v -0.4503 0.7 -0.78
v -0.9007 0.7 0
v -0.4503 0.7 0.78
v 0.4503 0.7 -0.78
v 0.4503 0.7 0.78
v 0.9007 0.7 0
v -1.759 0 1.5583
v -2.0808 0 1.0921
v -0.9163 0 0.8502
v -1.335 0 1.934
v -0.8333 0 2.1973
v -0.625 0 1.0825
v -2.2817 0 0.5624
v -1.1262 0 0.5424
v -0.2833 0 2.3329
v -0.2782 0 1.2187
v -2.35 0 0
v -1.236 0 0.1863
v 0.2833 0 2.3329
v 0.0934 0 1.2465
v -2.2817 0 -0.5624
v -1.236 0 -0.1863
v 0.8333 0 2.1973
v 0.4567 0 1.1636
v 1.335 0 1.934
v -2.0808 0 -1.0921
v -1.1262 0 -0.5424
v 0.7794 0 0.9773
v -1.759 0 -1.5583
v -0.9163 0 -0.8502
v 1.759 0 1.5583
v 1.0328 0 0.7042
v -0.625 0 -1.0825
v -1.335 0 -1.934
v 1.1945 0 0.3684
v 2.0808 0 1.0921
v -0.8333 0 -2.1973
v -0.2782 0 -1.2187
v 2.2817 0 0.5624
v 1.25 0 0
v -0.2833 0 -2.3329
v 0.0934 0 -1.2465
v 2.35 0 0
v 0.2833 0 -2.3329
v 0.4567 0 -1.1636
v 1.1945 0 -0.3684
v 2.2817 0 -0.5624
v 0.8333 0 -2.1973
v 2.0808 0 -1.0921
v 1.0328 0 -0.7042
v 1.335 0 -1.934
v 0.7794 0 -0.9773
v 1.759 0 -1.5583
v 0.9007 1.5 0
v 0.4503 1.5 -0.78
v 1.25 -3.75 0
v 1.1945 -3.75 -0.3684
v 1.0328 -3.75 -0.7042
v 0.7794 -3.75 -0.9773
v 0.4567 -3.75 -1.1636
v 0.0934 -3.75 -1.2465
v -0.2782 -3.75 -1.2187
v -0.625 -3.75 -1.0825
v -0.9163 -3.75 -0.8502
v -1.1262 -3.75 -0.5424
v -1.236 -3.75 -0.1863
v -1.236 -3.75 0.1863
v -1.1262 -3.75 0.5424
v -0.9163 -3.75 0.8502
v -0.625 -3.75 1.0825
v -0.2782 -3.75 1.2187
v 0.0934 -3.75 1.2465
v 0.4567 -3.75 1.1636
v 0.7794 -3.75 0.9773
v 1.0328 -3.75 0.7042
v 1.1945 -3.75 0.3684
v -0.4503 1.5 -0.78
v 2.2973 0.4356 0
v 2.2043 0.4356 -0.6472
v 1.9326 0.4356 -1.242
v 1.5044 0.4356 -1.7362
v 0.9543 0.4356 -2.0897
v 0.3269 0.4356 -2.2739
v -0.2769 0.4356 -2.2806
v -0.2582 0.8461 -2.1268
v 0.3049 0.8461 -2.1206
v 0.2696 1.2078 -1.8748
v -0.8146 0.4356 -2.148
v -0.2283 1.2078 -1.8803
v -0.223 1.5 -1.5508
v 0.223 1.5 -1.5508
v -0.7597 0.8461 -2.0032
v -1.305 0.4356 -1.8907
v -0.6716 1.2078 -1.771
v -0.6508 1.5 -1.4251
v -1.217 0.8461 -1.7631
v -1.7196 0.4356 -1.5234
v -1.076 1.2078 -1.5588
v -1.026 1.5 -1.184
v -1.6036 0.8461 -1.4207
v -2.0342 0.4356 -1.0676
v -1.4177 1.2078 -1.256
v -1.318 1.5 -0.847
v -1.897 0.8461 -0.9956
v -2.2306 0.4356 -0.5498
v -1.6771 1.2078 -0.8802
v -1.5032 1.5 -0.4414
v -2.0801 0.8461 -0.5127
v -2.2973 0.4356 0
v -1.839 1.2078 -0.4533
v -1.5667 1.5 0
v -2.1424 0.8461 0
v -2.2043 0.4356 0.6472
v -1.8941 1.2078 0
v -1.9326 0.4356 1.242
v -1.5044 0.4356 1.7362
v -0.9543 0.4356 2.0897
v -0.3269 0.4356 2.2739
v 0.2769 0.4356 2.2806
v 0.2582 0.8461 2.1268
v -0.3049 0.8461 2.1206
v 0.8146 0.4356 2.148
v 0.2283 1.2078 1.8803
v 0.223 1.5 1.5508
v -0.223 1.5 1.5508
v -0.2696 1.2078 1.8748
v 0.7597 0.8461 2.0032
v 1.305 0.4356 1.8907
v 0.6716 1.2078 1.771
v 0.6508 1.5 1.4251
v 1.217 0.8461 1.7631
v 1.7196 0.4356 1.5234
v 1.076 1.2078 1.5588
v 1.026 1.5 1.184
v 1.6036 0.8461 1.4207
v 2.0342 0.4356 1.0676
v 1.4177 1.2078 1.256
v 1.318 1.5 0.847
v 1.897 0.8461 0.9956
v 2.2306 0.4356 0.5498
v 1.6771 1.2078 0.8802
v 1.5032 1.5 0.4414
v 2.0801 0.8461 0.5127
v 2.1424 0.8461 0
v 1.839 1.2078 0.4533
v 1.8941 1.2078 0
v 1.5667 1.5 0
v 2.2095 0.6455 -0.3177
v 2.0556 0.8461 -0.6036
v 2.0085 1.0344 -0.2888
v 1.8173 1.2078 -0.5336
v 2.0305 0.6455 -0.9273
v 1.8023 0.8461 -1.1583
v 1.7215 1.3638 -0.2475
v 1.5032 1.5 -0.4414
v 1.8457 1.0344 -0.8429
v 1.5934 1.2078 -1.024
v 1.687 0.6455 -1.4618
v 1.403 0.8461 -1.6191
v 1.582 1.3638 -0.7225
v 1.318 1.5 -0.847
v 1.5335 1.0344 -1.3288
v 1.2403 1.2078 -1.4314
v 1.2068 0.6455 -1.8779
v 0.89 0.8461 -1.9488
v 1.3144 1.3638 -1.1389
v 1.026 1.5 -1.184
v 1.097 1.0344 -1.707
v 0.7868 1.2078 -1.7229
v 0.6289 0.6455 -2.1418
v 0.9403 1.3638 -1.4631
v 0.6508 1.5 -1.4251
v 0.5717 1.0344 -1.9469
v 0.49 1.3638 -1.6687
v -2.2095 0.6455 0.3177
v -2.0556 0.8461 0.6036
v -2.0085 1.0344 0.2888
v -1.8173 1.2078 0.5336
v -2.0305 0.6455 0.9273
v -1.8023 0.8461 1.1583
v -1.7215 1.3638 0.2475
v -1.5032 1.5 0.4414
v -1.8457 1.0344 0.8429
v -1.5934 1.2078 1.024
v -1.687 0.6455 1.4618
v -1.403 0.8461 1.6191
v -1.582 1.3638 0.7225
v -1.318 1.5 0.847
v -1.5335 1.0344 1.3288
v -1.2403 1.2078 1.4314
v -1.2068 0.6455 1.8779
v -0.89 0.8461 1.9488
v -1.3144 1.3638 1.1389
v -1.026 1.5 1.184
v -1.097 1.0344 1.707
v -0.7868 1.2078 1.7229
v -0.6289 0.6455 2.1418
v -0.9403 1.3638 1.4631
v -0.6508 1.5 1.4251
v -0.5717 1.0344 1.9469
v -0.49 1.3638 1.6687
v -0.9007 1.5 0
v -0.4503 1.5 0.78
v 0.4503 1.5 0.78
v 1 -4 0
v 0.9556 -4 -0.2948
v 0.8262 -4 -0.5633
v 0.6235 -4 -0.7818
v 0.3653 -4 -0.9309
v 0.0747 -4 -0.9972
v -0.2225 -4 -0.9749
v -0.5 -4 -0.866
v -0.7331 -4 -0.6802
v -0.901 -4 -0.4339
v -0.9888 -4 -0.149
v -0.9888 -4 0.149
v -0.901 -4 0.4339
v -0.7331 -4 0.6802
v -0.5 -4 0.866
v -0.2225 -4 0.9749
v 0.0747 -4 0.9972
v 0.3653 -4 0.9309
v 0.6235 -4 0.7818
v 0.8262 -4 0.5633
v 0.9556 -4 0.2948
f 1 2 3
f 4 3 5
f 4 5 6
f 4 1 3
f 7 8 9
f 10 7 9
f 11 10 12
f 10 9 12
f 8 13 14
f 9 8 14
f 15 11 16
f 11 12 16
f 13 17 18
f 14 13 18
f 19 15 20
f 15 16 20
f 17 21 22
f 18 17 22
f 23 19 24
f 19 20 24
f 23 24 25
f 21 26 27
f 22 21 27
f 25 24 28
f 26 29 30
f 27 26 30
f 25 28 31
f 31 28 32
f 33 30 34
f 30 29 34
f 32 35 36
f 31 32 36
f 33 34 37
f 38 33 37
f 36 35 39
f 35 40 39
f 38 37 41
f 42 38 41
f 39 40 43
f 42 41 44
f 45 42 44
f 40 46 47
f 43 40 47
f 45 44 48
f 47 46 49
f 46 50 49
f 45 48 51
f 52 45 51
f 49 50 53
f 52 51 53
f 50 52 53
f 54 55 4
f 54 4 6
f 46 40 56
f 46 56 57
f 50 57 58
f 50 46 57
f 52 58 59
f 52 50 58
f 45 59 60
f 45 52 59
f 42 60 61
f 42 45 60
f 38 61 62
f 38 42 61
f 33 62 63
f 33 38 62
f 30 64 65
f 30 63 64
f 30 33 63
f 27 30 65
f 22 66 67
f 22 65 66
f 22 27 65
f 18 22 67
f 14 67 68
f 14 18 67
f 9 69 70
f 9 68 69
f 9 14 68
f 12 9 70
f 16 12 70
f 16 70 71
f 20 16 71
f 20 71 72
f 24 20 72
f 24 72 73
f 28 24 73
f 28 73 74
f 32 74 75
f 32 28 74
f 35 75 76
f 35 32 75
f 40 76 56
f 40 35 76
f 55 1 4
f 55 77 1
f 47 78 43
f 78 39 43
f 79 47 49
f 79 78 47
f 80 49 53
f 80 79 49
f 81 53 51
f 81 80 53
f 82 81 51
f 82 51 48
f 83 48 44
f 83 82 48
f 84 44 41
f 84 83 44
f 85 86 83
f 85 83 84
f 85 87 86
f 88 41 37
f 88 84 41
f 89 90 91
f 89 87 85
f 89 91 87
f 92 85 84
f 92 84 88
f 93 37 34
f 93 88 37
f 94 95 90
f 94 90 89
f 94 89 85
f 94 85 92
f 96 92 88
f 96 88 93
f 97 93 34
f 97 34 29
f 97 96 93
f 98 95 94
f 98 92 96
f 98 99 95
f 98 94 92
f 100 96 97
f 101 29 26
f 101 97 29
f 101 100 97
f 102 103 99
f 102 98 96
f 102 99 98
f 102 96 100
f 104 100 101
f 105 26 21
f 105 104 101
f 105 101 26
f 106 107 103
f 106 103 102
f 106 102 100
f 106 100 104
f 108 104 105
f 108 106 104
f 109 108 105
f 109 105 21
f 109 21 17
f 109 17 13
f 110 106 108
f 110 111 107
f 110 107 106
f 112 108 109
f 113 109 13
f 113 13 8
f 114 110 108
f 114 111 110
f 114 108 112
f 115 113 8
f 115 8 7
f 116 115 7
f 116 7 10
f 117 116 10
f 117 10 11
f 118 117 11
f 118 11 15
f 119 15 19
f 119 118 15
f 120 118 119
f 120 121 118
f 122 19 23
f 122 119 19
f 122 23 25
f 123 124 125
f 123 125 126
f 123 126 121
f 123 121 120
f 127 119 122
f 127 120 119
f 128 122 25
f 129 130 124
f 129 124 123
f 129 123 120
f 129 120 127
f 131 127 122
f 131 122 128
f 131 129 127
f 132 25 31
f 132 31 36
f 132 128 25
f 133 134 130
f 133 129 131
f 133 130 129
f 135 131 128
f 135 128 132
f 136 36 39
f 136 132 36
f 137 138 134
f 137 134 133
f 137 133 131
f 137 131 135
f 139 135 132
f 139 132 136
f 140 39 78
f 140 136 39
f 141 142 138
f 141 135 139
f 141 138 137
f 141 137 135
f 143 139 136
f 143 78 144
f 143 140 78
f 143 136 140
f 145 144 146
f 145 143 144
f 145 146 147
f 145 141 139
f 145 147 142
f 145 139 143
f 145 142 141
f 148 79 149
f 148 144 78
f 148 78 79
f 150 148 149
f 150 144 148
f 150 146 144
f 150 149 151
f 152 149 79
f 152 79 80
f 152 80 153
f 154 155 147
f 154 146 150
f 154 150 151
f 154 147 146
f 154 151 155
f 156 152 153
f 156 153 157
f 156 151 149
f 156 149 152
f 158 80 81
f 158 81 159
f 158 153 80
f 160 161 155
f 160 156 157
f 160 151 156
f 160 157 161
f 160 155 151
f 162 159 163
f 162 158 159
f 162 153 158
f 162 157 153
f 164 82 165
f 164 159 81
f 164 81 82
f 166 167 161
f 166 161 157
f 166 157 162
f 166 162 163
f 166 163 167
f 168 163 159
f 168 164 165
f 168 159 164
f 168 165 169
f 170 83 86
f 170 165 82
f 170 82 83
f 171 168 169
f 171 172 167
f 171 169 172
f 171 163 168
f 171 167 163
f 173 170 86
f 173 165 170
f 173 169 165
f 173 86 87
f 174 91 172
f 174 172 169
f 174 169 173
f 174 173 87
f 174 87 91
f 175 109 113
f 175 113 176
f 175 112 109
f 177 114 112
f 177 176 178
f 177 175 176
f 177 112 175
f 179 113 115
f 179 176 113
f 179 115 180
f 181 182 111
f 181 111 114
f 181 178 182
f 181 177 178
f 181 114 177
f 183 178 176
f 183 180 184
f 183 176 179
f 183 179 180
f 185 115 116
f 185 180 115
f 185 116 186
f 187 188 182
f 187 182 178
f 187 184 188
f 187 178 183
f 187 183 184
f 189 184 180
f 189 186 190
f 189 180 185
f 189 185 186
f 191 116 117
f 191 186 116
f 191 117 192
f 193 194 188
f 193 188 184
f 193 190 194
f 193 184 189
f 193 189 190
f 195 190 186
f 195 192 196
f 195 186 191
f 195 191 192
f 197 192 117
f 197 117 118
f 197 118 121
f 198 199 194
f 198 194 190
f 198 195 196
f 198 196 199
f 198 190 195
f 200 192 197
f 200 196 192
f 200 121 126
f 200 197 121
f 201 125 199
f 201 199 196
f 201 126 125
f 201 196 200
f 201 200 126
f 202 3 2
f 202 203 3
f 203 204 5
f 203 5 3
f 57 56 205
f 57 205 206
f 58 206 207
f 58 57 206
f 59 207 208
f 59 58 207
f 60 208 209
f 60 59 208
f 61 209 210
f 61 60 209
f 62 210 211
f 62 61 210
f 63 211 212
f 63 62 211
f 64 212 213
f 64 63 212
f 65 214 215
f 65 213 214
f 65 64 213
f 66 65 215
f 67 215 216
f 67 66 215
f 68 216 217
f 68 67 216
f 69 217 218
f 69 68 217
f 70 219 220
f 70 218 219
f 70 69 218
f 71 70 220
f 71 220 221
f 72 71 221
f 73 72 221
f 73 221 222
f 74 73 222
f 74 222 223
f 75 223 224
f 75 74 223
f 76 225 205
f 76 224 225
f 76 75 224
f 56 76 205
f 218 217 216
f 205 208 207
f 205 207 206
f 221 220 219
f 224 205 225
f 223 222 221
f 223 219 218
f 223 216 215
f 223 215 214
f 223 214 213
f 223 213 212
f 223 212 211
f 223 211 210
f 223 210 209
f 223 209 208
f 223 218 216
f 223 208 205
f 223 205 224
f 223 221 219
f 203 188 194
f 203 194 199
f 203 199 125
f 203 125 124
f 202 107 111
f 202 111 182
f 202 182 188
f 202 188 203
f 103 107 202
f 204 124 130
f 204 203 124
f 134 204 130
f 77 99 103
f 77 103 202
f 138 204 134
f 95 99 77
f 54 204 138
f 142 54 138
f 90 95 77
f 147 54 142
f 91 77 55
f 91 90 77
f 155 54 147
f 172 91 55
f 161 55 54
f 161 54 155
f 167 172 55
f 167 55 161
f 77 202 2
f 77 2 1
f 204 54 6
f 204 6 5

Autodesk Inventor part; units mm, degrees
ref_plane "YZ Plane" through (0, 0, 0) normal (1, 0, 0) x (0, 1, 0)
ref_plane "XZ Plane" through (0, 0, 0) normal (0, 1, 0) x (-1, 0, 0)
ref_plane "XY Plane" through (0, 0, 0) normal (0, 0, 1) x (1, 0, 0)
sketch "Schizzo2" plane through (0, 0, 0) normal (0, 0, 1) x (1, 0, 0)
  line L0 (0, 0) -> (0, 1.5)
  line L1 (0, 1.5) -> (1.5667, 1.5)
  line L2 (0, 0) -> (2.35, 0)
  arc A0 (2.35, 0) -> (1.5667, 1.5) centre (0.5222, 0) ccw
  dimension "d0" = 2.35
  dimension "d1" = 1.5
  dimension "d2" = 1.5667
revolve "Rivoluzione1" add sketch "Schizzo2" angle 360 about axis through (0, 0, 0) along (0, 1, 0)
sketch "Schizzo3" plane through (0, 0, 0) normal (0, -1, 0) x (1, 0, 0)
  circle A0 centre (0, 0) radius 1.5667 projected
  circle A1 centre (0, 0) radius 1.25
  dimension "d4" = 2.5
extrude "Estrusione1" add sketch "Schizzo3" along normal blind 4 contours A1
thread "Filettatura1" size "M2.5x0.45" class "6g" standard "ISO Metric profile" length 20
chamfer "Smusso1" distance 0.25 angle 45 1 edges at (-1.25, -4, 0) measured on face at (-0.1478, -4, -0.3896)
sketch "Schizzo4" plane through (0, 1.5, 0) normal (0, 1, 0) x (1, 0, 0)
  circle A0 centre (0, 0) radius 1.25 projected
  line L0 (0.4503, 0.78) -> (0.9007, 0)
  line L1 (0.9007, 0) -> (0.4503, -0.78)
  line L2 (0.4503, -0.78) -> (-0.4503, -0.78)
  line L3 (-0.4503, -0.78) -> (-0.9007, 0)
  line L4 (-0.9007, 0) -> (-0.4503, 0.78)
  line L5 (-0.4503, 0.78) -> (0.4503, 0.78)
  dimension "d12" = 1.56
extrude "Estrusione2" cut sketch "Schizzo4" against normal blind 0.8 contours L0 L1 L2 L3 L4 L5
equation "\"d0\" = 0.5 * dk"
equation "\"d1\" = k"
equation "\"d2\" = 0.333333 * dk"
equation "\"d4\" = d"
equation "\"d5\" = L"
equation "\"d12\" = es"
equation "\"d13\" = t"
equation "\"t\" = 0.8"
equation "\"k\" = 1.5"
equation "\"d\" = 2.5"
equation "\"dk\" = 4.7"
equation "\"es\" = 1.56"
equation "\"L\" = 4"
properties part number "Vite ISO 7380"
